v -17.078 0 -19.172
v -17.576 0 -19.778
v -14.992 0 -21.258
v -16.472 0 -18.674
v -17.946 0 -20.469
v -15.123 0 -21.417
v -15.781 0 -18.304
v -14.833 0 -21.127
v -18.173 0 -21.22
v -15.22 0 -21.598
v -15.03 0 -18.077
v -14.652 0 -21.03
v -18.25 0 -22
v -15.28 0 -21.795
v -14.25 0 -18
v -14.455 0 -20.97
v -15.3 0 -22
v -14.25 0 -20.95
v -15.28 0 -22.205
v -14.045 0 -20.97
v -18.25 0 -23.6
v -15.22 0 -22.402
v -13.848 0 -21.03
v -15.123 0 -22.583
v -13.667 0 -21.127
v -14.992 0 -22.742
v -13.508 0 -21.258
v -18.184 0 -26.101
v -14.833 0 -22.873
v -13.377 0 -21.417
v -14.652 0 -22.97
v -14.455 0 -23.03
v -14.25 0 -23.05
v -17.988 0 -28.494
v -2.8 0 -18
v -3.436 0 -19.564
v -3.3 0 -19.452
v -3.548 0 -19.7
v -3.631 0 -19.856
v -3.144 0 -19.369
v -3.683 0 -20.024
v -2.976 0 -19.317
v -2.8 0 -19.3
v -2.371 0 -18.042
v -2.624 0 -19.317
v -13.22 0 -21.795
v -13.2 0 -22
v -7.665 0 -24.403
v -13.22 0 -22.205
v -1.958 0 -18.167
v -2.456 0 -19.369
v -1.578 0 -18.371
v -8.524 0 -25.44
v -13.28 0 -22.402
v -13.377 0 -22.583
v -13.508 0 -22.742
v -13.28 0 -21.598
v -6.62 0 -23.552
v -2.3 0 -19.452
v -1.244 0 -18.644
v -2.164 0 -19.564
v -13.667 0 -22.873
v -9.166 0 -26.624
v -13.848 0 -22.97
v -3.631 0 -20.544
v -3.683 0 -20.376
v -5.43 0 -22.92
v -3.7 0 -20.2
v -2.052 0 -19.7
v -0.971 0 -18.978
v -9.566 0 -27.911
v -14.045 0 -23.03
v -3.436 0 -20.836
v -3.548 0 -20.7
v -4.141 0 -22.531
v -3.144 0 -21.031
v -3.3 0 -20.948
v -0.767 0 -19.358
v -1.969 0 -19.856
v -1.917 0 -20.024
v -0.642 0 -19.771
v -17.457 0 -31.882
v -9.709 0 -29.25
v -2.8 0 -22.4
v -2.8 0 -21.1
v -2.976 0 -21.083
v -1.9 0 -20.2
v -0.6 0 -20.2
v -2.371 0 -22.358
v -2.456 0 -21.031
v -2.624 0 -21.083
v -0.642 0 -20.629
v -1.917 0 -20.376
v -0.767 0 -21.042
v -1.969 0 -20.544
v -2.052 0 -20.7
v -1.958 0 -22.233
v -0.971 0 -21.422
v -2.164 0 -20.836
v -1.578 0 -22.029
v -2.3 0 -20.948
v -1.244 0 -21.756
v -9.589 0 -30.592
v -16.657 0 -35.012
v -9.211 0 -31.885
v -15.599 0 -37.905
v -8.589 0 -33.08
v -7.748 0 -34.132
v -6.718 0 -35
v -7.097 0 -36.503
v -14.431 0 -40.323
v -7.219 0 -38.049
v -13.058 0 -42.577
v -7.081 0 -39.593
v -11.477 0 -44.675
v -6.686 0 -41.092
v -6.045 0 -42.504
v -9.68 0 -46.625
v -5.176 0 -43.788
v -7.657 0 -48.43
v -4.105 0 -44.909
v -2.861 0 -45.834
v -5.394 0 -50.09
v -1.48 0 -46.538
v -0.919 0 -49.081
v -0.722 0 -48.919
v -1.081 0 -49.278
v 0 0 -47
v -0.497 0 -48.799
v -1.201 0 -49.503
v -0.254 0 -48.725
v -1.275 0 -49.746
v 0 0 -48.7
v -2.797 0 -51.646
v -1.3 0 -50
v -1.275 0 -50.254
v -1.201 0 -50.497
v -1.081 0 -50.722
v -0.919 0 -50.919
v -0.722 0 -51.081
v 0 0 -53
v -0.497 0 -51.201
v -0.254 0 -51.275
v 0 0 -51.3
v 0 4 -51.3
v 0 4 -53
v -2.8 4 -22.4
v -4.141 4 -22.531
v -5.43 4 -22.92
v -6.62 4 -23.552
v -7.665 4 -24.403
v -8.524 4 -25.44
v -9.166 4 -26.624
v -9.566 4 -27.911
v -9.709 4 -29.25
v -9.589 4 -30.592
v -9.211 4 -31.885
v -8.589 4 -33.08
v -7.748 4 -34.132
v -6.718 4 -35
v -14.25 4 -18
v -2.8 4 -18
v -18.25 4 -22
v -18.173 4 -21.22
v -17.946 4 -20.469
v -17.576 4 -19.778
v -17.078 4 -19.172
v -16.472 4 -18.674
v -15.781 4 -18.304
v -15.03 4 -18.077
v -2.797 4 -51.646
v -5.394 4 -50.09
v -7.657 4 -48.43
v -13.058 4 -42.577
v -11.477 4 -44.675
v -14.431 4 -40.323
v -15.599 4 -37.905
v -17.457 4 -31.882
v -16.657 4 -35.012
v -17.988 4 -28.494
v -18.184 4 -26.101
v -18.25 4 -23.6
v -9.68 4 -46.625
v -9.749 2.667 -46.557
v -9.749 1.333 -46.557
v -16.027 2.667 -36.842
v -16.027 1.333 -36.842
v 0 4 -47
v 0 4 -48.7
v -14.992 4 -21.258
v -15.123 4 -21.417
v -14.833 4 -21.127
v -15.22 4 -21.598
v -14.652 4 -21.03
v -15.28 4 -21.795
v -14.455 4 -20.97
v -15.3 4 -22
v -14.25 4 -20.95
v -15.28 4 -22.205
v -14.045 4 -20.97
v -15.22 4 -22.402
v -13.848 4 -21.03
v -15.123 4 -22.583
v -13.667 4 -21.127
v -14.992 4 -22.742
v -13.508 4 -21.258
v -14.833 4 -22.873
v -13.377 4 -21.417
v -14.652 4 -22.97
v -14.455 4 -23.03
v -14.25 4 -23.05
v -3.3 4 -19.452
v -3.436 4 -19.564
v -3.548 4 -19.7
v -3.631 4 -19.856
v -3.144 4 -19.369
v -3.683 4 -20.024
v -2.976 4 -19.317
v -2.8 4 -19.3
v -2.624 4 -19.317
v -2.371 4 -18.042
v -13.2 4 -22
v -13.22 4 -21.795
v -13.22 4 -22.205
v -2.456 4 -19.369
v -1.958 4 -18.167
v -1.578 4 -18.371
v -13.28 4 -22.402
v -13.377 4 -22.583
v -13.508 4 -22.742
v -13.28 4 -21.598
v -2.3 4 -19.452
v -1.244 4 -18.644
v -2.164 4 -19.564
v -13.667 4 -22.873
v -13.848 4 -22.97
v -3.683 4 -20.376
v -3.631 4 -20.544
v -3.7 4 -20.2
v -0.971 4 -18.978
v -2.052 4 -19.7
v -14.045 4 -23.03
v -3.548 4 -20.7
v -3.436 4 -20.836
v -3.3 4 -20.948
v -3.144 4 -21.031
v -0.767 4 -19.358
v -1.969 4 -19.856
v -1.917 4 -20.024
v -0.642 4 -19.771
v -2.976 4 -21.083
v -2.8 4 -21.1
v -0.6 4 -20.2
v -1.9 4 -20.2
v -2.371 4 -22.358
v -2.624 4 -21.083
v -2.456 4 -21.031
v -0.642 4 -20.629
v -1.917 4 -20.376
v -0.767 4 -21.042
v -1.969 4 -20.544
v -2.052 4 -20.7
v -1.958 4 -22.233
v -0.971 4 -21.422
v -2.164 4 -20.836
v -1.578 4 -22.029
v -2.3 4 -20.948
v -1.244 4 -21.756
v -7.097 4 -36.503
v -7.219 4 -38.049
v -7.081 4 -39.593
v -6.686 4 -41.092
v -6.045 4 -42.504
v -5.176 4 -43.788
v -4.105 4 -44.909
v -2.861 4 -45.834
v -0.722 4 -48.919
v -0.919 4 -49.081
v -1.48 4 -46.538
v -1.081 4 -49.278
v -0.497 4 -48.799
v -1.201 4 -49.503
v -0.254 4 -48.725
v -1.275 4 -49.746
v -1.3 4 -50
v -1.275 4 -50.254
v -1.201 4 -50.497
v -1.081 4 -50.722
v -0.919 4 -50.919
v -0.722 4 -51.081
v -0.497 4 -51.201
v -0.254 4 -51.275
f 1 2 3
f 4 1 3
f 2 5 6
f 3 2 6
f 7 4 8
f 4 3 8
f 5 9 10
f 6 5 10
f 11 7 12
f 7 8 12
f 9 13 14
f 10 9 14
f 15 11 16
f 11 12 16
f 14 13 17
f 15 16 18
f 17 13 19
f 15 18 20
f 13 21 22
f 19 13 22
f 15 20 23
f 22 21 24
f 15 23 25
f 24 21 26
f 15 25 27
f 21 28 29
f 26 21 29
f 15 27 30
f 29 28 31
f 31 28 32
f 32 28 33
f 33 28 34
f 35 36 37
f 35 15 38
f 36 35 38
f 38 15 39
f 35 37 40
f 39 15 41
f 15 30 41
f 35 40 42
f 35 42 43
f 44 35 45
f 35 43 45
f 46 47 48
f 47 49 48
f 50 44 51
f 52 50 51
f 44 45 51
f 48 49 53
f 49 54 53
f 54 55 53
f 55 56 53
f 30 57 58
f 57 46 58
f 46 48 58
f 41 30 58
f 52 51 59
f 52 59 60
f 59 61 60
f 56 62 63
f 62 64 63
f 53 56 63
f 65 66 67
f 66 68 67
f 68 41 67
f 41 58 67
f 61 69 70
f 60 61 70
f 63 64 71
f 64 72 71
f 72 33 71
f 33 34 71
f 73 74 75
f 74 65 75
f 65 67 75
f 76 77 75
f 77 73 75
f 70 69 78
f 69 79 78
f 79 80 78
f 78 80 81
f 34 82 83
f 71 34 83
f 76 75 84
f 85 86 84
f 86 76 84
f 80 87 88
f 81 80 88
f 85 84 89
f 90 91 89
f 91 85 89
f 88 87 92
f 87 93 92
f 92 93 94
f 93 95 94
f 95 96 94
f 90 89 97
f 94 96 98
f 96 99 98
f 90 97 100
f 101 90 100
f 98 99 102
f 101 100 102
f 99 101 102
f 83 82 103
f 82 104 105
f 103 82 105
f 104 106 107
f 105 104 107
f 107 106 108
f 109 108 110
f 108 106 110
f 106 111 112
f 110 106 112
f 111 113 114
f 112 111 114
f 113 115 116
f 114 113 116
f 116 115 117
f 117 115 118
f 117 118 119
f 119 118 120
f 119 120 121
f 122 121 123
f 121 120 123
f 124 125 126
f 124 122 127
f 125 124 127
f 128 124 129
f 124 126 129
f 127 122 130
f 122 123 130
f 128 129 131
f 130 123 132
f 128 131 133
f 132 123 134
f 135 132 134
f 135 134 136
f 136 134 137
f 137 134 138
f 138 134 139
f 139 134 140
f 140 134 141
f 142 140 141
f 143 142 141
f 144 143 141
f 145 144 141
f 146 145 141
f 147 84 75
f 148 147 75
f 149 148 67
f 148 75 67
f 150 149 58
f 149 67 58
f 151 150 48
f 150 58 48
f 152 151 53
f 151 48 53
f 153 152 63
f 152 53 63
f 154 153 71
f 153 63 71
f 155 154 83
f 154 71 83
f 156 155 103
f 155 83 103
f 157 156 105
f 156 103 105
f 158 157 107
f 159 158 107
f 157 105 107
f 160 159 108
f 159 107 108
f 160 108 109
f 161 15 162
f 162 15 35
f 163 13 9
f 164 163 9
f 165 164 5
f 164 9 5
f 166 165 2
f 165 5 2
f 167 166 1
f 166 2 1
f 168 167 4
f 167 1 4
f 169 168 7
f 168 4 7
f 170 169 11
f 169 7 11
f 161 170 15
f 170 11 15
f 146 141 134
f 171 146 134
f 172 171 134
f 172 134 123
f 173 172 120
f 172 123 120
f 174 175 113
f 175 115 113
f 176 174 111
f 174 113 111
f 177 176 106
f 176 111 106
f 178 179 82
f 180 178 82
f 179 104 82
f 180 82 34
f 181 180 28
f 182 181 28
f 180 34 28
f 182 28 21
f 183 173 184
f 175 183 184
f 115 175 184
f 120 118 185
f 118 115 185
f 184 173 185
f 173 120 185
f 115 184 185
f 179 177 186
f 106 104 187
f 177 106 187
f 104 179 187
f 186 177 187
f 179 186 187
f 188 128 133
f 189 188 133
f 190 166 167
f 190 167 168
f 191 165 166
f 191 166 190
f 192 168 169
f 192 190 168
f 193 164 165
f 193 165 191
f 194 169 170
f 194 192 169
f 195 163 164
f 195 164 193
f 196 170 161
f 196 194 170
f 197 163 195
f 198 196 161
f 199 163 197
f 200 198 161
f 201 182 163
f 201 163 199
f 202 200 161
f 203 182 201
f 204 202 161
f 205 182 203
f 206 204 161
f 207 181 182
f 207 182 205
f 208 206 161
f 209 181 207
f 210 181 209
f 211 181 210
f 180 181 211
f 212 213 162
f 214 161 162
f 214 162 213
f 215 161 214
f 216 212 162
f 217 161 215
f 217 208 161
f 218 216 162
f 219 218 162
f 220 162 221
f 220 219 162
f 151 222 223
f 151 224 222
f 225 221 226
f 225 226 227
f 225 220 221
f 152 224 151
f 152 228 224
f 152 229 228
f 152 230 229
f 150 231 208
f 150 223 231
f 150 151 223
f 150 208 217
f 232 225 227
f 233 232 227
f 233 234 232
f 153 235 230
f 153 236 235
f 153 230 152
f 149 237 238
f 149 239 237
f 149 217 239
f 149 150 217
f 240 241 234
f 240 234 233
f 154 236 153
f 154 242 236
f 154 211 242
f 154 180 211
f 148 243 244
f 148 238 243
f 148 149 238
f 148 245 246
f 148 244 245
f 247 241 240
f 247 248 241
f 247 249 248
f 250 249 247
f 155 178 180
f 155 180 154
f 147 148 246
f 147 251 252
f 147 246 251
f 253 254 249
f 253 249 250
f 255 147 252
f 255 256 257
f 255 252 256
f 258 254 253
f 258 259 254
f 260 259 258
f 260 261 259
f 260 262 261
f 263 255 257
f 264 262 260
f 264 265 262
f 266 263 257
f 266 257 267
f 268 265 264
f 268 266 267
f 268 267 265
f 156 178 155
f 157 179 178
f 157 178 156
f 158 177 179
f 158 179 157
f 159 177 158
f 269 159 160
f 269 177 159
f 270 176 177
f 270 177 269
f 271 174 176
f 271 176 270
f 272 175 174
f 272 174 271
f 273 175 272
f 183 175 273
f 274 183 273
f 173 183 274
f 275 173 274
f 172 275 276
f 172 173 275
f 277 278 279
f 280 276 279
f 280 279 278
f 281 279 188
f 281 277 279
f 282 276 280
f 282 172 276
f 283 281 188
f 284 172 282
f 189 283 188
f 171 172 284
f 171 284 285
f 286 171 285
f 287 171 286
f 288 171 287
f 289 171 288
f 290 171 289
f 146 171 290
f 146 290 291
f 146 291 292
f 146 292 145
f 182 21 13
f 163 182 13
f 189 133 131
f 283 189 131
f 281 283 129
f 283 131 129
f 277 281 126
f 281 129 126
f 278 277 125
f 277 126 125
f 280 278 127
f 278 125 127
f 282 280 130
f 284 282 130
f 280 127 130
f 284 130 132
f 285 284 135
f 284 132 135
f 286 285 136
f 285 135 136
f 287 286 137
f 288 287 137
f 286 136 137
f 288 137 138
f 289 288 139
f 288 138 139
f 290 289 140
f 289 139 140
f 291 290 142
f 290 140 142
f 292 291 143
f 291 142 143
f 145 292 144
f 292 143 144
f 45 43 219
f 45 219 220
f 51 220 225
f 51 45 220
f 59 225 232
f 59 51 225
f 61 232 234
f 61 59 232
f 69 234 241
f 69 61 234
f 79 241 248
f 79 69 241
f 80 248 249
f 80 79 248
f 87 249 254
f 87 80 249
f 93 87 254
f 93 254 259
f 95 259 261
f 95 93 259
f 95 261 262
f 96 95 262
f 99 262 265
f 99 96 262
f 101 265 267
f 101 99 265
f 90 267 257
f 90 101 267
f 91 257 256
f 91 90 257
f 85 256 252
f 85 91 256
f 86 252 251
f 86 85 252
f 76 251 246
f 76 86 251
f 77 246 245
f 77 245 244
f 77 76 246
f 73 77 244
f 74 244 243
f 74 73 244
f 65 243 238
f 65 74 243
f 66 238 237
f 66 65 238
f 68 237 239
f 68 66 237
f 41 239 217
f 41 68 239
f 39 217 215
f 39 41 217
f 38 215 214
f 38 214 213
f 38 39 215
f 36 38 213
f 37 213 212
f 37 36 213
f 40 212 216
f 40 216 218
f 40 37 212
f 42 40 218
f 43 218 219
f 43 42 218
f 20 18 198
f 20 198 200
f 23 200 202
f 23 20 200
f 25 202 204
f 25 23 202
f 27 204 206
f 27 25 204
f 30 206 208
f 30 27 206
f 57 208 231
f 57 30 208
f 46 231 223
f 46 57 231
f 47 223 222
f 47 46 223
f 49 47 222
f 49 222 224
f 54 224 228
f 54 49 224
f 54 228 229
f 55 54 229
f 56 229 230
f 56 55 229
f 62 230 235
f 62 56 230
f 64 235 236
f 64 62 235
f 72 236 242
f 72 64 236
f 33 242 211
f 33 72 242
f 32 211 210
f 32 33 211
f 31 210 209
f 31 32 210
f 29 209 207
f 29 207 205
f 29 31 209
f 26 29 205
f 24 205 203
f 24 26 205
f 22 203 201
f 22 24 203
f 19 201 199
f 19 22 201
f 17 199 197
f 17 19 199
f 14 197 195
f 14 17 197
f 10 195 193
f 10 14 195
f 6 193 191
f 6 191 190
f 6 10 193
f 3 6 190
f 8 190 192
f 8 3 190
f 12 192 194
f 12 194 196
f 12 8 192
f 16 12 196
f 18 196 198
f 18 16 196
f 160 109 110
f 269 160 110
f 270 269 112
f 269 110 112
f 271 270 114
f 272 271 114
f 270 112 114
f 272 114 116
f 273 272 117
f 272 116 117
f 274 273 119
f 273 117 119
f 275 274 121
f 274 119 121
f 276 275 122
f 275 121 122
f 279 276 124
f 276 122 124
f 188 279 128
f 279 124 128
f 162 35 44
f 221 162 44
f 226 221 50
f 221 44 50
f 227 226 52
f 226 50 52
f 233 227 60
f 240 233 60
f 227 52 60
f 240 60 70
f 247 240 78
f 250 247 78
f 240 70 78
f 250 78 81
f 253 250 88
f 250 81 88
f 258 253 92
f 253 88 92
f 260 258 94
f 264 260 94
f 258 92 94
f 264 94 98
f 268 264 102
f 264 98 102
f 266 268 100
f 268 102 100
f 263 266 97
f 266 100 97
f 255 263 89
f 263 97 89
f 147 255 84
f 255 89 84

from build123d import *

# Parameters (mm, degrees)
SKETCH1_R           = 0.9
SKETCH1_R_2         = 1.05
BOSS_EXTRUDE2_DEPTH = 4


with BuildPart() as part:
    # Sketch1 → Boss-Extrude2 (new body)
    with BuildSketch(Plane(origin=(0, 0, 0), x_dir=(1, 0, 0), z_dir=(0, 1, 0))):
        with BuildLine():
            Line((0, 51.3), (0, 53))
            add(Edge.make_bspline(
                [(0, 53), (-11.288586004, 48.107069446), (-18.25, 38.69126661), (-18.25, 23.6)],
                knots=[0, 0, 0, 0, 1, 1, 1, 1], degree=3))
            Line((-18.25, 23.6), (-18.25, 22))
            ThreePointArc((-18.25, 22), (-17.078427125, 19.171572875), (-14.25, 18))
            Line((-14.25, 18), (-2.8, 18))
            ThreePointArc((-2.8, 18), (-0.6, 20.2), (-2.8, 22.4))
            ThreePointArc((-2.8, 22.4), (-9.397521131, 27.257683793), (-6.717797887, 35))
            ThreePointArc((-6.717797887, 35), (-6.044737279, 42.503576591), (0, 47))
            Line((0, 47), (0, 48.7))
            ThreePointArc((0, 48.7), (-1.3, 50), (0, 51.3))
        make_face()
        with Locations(Location((-2.8, 20.2, 0), (0, 0, 270))):
            Circle(SKETCH1_R, mode=Mode.SUBTRACT)
        with Locations(Location((-14.25, 22, 0), (0, 0, 270))):
            Circle(SKETCH1_R_2, mode=Mode.SUBTRACT)
    extrude(amount=BOSS_EXTRUDE2_DEPTH)


solid = part.part
